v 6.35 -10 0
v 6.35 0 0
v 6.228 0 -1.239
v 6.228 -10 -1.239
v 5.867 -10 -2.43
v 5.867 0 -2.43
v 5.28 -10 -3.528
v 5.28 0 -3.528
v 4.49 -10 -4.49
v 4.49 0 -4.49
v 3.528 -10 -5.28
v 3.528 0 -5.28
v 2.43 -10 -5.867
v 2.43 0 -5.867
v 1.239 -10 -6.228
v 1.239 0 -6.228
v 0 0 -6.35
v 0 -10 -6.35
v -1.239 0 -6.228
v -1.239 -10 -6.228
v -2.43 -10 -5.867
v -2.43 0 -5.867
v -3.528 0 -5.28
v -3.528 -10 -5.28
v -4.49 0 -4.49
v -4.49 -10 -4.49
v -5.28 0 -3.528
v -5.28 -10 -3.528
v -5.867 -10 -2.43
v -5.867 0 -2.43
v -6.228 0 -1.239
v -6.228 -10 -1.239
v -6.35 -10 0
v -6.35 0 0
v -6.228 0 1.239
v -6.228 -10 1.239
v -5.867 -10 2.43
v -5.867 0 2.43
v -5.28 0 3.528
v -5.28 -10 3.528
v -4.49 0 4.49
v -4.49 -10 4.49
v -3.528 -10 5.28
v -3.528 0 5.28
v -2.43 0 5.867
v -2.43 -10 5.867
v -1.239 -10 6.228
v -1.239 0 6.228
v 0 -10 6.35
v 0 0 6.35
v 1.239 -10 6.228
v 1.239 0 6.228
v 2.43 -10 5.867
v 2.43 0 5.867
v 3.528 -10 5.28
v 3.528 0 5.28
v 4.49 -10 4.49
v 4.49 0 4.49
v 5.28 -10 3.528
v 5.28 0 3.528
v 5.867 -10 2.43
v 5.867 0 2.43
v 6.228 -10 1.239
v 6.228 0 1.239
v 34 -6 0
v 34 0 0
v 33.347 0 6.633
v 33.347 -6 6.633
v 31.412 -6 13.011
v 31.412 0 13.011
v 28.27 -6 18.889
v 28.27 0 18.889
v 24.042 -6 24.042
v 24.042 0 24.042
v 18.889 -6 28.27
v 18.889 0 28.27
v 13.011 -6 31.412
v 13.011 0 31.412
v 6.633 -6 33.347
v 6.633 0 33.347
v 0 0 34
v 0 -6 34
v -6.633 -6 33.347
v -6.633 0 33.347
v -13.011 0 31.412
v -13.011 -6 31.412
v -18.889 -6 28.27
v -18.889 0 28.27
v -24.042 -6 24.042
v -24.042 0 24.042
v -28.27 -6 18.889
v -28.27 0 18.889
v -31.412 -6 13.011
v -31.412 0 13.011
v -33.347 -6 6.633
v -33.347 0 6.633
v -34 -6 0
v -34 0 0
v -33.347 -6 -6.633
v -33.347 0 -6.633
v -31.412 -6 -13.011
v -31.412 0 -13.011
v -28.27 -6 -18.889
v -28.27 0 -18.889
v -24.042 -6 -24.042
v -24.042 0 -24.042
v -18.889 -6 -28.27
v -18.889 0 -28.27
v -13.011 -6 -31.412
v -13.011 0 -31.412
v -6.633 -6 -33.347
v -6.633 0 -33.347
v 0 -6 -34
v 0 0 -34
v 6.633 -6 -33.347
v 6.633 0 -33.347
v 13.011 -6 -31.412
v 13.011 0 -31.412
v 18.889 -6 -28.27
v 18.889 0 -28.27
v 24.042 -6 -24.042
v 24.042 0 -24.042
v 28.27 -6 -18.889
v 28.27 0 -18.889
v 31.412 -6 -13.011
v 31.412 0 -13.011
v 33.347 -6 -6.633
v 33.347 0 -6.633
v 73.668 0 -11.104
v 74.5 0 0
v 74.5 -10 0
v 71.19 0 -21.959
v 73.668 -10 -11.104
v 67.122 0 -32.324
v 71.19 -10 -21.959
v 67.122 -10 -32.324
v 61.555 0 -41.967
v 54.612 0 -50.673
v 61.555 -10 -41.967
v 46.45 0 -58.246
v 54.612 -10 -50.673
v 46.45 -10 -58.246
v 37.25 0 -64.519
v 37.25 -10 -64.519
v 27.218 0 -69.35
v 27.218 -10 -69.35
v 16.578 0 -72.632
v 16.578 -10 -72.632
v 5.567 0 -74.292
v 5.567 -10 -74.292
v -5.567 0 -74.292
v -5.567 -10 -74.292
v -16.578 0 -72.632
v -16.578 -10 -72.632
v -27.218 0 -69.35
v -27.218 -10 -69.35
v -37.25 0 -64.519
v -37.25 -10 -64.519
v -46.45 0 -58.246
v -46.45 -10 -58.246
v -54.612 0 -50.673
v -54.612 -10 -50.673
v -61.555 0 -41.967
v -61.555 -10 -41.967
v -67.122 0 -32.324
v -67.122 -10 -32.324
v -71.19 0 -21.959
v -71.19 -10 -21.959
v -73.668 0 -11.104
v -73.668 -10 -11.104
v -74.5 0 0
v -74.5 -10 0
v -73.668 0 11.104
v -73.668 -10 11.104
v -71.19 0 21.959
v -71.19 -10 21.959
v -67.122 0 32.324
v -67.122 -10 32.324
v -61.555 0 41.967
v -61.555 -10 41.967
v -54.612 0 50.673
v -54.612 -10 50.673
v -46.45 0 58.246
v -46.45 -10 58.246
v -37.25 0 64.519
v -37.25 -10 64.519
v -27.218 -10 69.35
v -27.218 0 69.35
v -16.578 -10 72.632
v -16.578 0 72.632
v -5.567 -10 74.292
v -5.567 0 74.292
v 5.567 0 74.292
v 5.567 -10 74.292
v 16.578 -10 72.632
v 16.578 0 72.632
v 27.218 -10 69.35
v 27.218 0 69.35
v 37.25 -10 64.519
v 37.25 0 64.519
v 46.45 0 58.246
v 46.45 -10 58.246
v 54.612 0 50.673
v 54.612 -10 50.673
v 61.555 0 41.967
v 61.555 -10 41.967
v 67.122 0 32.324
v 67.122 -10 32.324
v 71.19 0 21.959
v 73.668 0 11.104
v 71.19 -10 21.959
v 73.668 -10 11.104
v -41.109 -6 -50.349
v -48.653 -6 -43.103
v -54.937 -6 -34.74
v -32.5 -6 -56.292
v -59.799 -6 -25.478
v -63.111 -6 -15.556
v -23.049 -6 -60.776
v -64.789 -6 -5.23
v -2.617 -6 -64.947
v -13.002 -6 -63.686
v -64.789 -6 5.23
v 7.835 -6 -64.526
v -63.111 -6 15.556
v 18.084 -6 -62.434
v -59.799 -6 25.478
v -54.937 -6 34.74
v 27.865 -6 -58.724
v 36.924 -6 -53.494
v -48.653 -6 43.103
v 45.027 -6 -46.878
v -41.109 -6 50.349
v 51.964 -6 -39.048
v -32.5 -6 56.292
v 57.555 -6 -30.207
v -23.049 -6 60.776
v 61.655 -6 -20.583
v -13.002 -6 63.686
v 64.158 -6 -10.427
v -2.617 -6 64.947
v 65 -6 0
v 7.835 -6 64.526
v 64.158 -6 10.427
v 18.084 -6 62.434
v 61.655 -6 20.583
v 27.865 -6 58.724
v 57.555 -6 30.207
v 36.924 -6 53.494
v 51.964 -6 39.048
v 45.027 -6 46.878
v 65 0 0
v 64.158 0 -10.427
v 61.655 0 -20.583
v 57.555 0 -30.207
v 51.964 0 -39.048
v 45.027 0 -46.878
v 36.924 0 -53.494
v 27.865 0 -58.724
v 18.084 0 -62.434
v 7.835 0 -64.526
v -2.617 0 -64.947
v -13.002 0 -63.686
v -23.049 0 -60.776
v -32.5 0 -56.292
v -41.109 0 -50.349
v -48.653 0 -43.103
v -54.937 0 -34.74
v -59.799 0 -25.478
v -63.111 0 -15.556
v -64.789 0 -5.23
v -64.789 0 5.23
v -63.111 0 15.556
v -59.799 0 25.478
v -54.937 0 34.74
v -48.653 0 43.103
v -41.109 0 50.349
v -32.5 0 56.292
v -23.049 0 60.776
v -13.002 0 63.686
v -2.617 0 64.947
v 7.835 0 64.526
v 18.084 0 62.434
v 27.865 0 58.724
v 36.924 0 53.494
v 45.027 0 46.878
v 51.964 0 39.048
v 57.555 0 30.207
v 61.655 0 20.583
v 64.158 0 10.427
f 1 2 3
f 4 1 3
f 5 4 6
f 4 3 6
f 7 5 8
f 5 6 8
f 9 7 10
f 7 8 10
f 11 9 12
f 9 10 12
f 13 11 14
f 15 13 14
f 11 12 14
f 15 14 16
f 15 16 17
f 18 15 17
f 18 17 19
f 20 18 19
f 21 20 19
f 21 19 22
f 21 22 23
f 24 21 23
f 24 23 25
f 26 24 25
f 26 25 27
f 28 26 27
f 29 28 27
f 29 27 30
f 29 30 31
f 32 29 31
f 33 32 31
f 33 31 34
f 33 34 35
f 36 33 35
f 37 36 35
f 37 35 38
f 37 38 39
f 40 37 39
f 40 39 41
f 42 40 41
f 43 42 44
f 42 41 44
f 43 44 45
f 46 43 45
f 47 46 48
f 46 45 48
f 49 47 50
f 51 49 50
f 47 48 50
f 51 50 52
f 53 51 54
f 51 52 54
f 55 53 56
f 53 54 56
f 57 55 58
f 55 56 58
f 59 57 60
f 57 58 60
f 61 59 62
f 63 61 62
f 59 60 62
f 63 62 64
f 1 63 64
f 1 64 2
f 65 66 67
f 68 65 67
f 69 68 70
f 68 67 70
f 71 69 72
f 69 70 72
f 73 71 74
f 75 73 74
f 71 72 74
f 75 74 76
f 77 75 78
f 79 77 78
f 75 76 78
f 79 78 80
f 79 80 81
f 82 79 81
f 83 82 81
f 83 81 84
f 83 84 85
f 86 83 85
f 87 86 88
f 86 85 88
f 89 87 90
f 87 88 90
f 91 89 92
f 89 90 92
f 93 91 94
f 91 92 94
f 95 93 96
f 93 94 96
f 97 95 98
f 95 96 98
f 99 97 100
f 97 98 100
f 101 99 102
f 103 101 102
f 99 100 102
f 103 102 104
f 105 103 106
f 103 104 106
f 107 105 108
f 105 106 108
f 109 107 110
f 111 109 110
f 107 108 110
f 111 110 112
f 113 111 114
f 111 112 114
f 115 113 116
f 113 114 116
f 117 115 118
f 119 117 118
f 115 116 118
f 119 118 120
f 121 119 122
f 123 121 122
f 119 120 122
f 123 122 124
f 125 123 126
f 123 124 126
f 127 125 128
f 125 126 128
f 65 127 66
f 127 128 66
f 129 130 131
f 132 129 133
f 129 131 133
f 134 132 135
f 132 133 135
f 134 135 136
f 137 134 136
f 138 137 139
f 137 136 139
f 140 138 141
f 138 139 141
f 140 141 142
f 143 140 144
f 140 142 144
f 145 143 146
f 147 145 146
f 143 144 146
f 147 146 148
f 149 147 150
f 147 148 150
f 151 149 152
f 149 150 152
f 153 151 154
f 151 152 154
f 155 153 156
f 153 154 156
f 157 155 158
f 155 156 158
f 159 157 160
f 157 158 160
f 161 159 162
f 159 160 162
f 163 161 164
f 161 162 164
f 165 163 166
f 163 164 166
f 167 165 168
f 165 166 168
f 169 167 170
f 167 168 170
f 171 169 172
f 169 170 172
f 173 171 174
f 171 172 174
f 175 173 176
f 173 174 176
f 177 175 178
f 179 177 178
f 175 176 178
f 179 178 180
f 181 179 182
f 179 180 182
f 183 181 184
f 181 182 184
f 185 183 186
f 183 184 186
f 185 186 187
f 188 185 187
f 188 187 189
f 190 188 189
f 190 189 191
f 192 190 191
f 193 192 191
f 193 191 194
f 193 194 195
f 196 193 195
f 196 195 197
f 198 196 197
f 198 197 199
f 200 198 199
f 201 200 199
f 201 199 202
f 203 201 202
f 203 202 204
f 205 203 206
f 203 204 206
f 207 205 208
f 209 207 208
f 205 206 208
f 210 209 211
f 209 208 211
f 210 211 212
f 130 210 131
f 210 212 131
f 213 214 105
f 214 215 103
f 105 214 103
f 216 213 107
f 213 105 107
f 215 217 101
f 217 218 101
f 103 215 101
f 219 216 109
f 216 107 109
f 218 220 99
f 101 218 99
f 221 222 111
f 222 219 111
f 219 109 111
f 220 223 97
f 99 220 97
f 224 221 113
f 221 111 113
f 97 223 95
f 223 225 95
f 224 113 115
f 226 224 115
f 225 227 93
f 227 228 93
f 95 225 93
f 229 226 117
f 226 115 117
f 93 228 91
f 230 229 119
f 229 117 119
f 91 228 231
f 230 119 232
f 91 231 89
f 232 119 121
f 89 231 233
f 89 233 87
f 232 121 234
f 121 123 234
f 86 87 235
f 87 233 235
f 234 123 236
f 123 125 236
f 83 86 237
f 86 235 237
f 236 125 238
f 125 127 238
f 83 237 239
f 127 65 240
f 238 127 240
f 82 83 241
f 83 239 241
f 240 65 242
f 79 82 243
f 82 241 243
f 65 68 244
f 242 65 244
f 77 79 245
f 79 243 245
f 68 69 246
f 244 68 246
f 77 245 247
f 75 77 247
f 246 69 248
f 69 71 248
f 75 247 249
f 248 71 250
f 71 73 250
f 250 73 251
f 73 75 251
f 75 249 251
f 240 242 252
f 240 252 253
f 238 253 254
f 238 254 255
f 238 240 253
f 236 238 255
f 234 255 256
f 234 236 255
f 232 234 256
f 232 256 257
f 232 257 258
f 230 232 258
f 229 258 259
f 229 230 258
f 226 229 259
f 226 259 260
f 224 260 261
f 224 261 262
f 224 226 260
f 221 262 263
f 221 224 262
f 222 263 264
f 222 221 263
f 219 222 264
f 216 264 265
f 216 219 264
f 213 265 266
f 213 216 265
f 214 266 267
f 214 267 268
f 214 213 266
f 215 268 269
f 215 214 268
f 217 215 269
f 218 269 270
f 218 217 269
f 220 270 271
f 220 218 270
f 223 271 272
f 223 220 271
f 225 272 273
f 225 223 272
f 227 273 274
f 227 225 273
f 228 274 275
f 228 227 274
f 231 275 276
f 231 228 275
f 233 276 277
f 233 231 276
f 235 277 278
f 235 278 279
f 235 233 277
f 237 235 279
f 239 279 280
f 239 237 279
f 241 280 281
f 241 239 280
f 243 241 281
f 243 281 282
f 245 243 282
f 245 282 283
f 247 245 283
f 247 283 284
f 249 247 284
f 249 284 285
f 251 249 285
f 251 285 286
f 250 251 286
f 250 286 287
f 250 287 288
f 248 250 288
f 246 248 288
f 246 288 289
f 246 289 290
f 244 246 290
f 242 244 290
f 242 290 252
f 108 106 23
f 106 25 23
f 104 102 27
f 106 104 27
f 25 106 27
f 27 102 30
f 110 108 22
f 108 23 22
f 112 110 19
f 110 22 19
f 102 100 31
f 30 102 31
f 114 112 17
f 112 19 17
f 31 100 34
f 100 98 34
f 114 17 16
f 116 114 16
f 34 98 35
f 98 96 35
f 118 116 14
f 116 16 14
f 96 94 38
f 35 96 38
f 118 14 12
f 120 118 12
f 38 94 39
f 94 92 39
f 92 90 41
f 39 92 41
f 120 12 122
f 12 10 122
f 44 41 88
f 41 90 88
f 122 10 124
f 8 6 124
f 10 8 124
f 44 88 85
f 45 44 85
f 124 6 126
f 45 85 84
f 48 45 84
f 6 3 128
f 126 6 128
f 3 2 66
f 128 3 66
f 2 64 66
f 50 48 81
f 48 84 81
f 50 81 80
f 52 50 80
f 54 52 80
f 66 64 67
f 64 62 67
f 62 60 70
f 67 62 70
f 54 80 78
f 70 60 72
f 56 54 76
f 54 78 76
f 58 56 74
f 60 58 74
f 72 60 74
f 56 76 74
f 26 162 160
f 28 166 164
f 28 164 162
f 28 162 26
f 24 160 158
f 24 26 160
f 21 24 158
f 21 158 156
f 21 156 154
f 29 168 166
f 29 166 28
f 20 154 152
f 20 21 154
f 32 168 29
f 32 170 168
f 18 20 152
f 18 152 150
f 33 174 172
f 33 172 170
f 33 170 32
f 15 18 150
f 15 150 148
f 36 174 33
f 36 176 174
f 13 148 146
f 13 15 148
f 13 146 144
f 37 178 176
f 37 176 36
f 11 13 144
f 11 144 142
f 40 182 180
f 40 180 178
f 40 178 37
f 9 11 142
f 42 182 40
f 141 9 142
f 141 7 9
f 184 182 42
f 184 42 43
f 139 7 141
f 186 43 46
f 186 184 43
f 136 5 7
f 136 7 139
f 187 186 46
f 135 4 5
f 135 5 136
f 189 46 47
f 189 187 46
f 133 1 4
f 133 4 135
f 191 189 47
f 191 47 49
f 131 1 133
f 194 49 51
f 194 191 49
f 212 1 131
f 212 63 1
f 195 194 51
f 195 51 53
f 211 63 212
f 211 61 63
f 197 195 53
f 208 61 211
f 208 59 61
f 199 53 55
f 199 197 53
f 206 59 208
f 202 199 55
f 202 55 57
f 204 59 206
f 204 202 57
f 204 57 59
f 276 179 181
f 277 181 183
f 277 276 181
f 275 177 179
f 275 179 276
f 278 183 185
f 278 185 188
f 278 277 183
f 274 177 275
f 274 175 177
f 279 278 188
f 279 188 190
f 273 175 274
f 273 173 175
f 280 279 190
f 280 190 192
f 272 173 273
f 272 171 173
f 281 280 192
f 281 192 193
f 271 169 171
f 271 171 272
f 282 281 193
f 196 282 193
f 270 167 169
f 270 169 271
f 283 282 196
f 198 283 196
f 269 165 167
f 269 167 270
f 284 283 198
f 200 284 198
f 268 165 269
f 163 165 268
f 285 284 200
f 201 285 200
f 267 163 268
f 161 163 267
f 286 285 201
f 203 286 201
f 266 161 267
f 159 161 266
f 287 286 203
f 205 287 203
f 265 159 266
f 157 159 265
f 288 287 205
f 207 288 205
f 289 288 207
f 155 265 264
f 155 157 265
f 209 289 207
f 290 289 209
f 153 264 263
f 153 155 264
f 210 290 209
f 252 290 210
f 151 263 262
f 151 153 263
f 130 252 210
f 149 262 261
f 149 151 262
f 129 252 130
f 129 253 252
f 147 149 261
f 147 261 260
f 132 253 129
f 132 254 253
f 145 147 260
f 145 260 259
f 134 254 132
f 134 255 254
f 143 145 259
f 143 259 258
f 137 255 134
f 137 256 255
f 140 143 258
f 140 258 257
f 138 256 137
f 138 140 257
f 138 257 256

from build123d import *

# Parameters (mm, degrees)
SKETCH016_R     = 34
PAD013_DEPTH    = 6
SKETCH017_R     = 74.5
PAD014_DEPTH    = 4
SKETCH018_R     = 74.5
SKETCH018_R_2   = 65
PAD015_DEPTH    = 6
SKETCH019_R     = 6.35
POCKET003_DEPTH = 10.001


with BuildPart() as part:
    # Sketch016 → Pad013 (new body)
    with BuildSketch(Plane.XZ):
        Circle(SKETCH016_R)
    extrude(amount=PAD013_DEPTH)

    # Sketch017 (on Face3 of Pad013) → Pad014 (join)
    with BuildSketch(Plane.XZ.offset(6)):
        Circle(SKETCH017_R)
    extrude(amount=PAD014_DEPTH)

    # Sketch018 (on Face2 of Pad014) → Pad015 (join)
    with BuildSketch(Plane(origin=(0, -6, 0), x_dir=(1, 0, 0), z_dir=(0, 1, 0))):
        Circle(SKETCH018_R)
        Circle(SKETCH018_R_2, mode=Mode.SUBTRACT)
    extrude(amount=PAD015_DEPTH)

    # Sketch019 (on Face8 of Pad015) → Pocket003 (cut, through all)
    with BuildSketch(Plane(origin=(0, 0, 0), x_dir=(1, 0, 0), z_dir=(0, 1, 0))):
        Circle(SKETCH019_R)
    extrude(amount=-POCKET003_DEPTH, mode=Mode.SUBTRACT)


solid = part.part
